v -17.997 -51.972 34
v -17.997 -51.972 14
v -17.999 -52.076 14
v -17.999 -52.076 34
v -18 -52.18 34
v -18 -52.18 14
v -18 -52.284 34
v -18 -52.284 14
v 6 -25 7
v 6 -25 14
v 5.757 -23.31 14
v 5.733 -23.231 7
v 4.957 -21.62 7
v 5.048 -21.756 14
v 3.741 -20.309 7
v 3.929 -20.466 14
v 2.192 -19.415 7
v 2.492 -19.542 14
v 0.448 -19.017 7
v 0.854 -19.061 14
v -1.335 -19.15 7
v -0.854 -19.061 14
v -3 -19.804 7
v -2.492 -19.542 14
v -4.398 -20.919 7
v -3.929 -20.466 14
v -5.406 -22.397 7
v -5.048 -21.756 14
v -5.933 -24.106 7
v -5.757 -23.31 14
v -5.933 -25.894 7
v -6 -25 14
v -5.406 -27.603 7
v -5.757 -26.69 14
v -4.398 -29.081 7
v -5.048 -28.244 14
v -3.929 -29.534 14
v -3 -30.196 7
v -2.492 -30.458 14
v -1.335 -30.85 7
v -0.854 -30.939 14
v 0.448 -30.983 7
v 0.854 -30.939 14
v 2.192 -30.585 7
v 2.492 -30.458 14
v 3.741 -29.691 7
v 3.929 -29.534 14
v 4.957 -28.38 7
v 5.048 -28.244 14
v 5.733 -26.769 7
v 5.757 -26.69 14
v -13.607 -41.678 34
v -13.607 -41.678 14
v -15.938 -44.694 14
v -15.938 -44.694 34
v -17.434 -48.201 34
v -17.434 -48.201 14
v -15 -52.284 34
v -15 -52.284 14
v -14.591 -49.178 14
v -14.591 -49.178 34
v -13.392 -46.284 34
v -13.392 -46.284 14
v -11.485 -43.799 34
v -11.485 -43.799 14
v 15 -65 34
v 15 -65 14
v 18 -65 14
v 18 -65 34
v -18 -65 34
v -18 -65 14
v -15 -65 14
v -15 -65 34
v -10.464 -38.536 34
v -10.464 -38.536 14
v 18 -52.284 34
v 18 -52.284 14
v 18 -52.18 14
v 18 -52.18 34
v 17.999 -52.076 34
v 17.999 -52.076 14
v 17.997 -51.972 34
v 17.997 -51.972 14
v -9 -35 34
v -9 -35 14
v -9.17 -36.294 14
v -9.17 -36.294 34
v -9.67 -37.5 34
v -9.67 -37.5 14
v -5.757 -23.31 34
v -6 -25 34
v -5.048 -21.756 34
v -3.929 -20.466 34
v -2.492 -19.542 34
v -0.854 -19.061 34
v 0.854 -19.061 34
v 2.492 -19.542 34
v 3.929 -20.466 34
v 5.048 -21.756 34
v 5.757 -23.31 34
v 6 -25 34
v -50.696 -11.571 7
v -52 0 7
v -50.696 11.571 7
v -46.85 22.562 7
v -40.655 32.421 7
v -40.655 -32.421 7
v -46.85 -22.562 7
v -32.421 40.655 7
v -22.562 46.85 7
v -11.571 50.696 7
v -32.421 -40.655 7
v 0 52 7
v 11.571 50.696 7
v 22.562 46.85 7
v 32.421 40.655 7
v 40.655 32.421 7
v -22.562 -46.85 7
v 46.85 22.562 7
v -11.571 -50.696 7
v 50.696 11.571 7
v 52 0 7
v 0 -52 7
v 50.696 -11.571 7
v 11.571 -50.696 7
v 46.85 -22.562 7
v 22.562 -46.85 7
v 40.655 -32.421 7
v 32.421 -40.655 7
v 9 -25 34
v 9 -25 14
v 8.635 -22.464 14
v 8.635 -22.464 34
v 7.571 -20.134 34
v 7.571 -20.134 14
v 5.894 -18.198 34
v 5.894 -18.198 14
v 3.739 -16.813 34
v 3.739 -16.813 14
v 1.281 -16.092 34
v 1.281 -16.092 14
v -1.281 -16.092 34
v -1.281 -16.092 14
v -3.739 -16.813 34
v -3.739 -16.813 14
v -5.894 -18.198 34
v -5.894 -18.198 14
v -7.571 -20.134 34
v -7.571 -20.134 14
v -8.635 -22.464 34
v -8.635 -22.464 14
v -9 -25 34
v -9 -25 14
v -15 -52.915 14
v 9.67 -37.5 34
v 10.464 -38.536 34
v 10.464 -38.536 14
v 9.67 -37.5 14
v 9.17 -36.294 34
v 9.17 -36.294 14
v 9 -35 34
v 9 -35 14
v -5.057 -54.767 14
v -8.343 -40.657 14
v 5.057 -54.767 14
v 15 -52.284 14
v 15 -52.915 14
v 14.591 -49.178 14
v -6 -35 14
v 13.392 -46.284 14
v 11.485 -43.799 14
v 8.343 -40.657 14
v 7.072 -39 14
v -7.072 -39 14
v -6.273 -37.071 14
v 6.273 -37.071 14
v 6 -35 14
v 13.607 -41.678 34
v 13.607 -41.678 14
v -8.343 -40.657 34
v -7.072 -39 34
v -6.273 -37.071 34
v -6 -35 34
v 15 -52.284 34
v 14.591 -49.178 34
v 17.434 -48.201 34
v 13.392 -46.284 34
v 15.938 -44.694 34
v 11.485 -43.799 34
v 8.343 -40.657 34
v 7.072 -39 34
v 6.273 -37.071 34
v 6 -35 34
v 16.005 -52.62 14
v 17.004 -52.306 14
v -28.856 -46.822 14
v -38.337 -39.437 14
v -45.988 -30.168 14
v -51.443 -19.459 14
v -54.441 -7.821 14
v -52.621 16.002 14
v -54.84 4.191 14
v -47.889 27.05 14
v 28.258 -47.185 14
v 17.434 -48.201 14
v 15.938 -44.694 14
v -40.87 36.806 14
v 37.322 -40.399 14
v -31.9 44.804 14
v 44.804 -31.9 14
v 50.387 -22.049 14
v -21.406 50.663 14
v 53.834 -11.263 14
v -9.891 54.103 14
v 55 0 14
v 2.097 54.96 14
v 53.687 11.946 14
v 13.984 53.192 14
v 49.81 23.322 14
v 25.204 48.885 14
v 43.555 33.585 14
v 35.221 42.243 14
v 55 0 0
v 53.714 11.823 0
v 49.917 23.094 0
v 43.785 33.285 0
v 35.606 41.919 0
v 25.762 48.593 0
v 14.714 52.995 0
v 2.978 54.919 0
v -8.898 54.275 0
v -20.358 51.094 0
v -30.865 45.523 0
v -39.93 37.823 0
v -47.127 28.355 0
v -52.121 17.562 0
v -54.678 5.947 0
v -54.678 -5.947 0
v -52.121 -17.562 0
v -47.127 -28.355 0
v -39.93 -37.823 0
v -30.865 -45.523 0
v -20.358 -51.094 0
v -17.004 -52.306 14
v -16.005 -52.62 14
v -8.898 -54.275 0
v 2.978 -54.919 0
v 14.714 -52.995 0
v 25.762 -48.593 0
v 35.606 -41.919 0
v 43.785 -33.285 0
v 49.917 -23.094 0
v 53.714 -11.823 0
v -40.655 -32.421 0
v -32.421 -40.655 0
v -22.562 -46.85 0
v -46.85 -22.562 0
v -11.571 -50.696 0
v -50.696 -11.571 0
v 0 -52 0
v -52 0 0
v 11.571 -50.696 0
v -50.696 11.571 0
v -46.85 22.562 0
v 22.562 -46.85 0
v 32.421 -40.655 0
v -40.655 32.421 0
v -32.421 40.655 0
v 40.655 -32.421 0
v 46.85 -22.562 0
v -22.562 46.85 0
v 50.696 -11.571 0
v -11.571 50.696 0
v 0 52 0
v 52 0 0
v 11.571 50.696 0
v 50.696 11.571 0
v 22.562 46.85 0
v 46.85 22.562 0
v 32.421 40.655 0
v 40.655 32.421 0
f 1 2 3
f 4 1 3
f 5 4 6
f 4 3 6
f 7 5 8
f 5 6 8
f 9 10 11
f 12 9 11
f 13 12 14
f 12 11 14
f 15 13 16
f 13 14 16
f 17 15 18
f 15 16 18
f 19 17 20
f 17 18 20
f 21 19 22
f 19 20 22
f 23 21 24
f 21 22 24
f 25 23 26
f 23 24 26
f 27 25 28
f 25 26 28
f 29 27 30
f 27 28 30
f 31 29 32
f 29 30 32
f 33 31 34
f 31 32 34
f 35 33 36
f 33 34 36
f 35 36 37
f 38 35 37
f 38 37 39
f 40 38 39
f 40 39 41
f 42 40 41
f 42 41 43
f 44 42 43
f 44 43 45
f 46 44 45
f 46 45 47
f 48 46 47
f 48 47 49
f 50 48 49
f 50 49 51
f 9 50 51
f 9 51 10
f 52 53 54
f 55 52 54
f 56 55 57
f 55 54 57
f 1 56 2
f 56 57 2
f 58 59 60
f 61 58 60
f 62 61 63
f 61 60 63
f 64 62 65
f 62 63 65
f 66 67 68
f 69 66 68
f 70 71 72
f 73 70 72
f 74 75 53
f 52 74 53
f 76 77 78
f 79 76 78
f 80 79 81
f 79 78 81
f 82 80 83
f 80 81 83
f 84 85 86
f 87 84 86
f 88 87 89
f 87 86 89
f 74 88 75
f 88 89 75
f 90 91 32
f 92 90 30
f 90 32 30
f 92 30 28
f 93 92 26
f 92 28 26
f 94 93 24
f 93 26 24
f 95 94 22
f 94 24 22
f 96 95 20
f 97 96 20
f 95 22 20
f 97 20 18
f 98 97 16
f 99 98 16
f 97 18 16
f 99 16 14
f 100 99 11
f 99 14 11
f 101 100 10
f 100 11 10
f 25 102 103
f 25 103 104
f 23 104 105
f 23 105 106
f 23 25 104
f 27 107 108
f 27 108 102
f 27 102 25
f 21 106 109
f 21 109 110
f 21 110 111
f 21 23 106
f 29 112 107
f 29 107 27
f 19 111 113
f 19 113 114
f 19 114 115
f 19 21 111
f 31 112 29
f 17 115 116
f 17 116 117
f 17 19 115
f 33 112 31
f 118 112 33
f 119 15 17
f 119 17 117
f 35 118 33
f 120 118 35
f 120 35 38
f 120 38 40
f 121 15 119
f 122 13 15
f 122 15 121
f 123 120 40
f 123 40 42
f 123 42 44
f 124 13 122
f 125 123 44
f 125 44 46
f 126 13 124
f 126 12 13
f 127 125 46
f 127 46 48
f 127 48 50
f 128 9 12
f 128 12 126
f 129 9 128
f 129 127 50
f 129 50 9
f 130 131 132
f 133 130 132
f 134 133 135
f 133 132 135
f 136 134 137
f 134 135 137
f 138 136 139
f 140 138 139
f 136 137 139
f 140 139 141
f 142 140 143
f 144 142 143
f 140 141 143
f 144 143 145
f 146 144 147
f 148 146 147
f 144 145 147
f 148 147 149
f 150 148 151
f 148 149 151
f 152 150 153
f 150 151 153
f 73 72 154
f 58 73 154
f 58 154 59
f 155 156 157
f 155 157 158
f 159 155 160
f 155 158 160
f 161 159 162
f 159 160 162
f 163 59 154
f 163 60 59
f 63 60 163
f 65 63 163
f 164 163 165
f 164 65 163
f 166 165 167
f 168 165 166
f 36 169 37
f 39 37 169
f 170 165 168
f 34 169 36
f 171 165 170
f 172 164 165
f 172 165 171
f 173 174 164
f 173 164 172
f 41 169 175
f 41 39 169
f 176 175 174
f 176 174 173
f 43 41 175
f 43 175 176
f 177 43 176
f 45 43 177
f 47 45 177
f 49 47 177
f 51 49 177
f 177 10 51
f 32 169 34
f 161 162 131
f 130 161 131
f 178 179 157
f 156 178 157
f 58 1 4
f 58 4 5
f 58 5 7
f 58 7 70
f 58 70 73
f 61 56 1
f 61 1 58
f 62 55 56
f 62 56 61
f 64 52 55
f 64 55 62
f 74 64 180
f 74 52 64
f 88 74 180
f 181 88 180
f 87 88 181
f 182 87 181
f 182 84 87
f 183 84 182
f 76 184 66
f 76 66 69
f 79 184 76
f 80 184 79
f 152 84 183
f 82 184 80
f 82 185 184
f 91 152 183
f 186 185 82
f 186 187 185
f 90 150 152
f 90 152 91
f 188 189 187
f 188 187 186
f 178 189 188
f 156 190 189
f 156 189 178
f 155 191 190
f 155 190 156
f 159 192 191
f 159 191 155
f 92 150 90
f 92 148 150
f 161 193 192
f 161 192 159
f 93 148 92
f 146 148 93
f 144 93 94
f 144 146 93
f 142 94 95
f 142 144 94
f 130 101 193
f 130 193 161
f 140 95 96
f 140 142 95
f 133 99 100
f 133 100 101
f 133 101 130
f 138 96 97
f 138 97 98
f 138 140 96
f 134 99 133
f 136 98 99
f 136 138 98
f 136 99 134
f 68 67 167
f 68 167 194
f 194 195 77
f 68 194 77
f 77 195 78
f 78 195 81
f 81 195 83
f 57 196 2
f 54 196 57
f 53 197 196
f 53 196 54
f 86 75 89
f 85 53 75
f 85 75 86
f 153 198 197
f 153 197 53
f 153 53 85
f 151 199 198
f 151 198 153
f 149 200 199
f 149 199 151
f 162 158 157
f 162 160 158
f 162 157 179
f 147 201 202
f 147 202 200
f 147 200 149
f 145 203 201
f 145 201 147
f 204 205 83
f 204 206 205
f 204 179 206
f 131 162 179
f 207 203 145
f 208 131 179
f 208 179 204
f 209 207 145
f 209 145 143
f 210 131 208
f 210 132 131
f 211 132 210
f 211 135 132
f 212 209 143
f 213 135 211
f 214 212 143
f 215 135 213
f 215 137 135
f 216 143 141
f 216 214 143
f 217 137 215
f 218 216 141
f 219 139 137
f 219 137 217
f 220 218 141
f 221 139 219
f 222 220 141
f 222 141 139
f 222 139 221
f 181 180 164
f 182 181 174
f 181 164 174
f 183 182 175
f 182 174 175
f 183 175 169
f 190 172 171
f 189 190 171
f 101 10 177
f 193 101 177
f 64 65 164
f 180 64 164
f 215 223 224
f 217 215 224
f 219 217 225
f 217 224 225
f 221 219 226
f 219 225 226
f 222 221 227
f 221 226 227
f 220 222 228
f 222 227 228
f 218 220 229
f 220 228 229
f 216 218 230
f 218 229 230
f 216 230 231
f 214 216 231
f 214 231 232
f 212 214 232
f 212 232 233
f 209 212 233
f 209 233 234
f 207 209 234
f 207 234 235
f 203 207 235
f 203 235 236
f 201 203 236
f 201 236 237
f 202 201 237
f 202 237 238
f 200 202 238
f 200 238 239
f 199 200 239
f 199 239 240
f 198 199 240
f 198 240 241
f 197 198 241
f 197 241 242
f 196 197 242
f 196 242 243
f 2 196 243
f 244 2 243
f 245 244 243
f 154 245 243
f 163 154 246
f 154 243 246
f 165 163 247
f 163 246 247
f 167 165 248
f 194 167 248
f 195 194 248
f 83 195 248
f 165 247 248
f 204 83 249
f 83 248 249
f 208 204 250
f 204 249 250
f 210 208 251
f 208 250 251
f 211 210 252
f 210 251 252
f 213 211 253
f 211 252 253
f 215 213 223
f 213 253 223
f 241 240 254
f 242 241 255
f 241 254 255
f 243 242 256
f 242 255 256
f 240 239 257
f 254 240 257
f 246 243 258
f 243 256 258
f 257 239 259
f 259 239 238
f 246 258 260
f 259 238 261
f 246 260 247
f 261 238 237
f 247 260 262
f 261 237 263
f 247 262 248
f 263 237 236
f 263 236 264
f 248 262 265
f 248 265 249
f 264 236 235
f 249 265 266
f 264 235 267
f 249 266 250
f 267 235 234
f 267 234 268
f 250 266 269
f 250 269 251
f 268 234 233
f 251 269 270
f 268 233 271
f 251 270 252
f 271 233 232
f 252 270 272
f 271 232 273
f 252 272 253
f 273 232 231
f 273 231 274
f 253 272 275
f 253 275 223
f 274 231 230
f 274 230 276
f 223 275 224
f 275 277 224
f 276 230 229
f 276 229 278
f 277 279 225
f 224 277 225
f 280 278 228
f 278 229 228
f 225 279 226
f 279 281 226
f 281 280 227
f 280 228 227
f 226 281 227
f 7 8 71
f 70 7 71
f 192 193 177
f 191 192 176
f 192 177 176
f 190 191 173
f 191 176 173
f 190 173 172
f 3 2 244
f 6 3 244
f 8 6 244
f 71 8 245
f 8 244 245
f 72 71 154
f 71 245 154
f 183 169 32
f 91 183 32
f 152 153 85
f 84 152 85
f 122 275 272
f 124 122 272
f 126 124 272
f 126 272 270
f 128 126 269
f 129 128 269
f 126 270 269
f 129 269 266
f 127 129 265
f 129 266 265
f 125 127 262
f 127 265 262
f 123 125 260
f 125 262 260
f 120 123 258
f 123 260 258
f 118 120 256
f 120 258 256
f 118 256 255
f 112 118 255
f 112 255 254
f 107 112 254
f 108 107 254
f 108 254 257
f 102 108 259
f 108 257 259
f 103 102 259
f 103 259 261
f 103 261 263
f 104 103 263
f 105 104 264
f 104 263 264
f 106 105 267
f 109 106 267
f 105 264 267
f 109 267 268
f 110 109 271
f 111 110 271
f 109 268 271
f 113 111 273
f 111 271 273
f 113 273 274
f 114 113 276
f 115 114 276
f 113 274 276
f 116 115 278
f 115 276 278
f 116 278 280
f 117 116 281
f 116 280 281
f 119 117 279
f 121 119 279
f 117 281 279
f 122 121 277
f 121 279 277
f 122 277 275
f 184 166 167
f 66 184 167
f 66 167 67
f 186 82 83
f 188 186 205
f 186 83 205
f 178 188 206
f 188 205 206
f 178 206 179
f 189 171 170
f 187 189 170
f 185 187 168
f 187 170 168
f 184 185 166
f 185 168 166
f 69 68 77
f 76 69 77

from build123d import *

# Parameters (mm, degrees)
F0_R     = 55
F1_DEPTH = 14
F2_R     = 52
F3_DEPTH = 7
F4_R     = 6
F5_DEPTH = 14.001
F7_DEPTH = 20


with BuildPart() as f1:
    # F0 (on Top) → F1 (new body)
    with BuildSketch(Plane.XY):
        Circle(F0_R)
    extrude(amount=F1_DEPTH)

    # F2 (on face) → F3 (cut)
    with BuildSketch(Plane(origin=(0, 0, 0), x_dir=(1, 0, 0), z_dir=(0, 0, -1))):
        Circle(F2_R)
    extrude(amount=-F3_DEPTH, mode=Mode.SUBTRACT)

    # F4 (on face) → F5 (cut, through all)
    with BuildSketch(Plane.XY.offset(14)):
        with Locations((0, -25)):
            Circle(F4_R)
    extrude(amount=-F5_DEPTH, mode=Mode.SUBTRACT)

    # F6 (on face) → F7 (join)
    with BuildSketch(Plane.XY.offset(14)):
        with BuildLine():
            Line((-15, -65), (-15, -52.915026))
            ThreePointArc((-15, -52.915026), (-16.50511, -52.465049), (-17.996755, -51.97227))
            ThreePointArc((-17.996755, -51.97227), (-17.999189, -52.128262), (-18, -52.284271))
            Line((-18, -52.284271), (-18, -65))
            Line((-18, -65), (-15, -65))
        make_face()
        with BuildLine():
            Line((-6, -35), (-6, -25))
            ThreePointArc((-6, -25), (0, -19), (6, -25))
            Line((6, -25), (6, -35))
            ThreePointArc((6, -35), (6.608964, -38.061467), (8.343146, -40.656854))
            Line((8.343146, -40.656854), (11.485281, -43.79899))
            ThreePointArc((11.485281, -43.79899), (14.086554, -47.69207), (15, -52.284271))
            Line((15, -52.284271), (15, -52.915026))
            ThreePointArc((15, -52.915026), (16.50511, -52.465049), (17.996755, -51.97227))
            ThreePointArc((17.996755, -51.97227), (16.797741, -46.400197), (13.606602, -41.67767))
            Line((13.606602, -41.67767), (10.464466, -38.535534))
            ThreePointArc((10.464466, -38.535534), (9.380602, -36.913417), (9, -35))
            Line((9, -35), (9, -25))
            ThreePointArc((9, -25), (0, -16), (-9, -25))
            Line((-9, -25), (-9, -35))
            ThreePointArc((-9, -35), (-9.380602, -36.913417), (-10.464466, -38.535534))
            Line((-10.464466, -38.535534), (-13.606602, -41.67767))
            ThreePointArc((-13.606602, -41.67767), (-16.797741, -46.400197), (-17.996755, -51.97227))
            ThreePointArc((-17.996755, -51.97227), (-16.50511, -52.465049), (-15, -52.915026))
            Line((-15, -52.915026), (-15, -52.284271))
            ThreePointArc((-15, -52.284271), (-14.086554, -47.69207), (-11.485281, -43.79899))
            Line((-11.485281, -43.79899), (-8.343146, -40.656854))
            ThreePointArc((-8.343146, -40.656854), (-6.608964, -38.061467), (-6, -35))
        make_face()
        with BuildLine():
            ThreePointArc((17.996755, -51.97227), (16.50511, -52.465049), (15, -52.915026))
            Line((15, -52.915026), (15, -65))
            Line((15, -65), (18, -65))
            Line((18, -65), (18, -52.284271))
            ThreePointArc((18, -52.284271), (17.999189, -52.128262), (17.996755, -51.97227))
        make_face()
    extrude(amount=F7_DEPTH)


solid = f1.part
